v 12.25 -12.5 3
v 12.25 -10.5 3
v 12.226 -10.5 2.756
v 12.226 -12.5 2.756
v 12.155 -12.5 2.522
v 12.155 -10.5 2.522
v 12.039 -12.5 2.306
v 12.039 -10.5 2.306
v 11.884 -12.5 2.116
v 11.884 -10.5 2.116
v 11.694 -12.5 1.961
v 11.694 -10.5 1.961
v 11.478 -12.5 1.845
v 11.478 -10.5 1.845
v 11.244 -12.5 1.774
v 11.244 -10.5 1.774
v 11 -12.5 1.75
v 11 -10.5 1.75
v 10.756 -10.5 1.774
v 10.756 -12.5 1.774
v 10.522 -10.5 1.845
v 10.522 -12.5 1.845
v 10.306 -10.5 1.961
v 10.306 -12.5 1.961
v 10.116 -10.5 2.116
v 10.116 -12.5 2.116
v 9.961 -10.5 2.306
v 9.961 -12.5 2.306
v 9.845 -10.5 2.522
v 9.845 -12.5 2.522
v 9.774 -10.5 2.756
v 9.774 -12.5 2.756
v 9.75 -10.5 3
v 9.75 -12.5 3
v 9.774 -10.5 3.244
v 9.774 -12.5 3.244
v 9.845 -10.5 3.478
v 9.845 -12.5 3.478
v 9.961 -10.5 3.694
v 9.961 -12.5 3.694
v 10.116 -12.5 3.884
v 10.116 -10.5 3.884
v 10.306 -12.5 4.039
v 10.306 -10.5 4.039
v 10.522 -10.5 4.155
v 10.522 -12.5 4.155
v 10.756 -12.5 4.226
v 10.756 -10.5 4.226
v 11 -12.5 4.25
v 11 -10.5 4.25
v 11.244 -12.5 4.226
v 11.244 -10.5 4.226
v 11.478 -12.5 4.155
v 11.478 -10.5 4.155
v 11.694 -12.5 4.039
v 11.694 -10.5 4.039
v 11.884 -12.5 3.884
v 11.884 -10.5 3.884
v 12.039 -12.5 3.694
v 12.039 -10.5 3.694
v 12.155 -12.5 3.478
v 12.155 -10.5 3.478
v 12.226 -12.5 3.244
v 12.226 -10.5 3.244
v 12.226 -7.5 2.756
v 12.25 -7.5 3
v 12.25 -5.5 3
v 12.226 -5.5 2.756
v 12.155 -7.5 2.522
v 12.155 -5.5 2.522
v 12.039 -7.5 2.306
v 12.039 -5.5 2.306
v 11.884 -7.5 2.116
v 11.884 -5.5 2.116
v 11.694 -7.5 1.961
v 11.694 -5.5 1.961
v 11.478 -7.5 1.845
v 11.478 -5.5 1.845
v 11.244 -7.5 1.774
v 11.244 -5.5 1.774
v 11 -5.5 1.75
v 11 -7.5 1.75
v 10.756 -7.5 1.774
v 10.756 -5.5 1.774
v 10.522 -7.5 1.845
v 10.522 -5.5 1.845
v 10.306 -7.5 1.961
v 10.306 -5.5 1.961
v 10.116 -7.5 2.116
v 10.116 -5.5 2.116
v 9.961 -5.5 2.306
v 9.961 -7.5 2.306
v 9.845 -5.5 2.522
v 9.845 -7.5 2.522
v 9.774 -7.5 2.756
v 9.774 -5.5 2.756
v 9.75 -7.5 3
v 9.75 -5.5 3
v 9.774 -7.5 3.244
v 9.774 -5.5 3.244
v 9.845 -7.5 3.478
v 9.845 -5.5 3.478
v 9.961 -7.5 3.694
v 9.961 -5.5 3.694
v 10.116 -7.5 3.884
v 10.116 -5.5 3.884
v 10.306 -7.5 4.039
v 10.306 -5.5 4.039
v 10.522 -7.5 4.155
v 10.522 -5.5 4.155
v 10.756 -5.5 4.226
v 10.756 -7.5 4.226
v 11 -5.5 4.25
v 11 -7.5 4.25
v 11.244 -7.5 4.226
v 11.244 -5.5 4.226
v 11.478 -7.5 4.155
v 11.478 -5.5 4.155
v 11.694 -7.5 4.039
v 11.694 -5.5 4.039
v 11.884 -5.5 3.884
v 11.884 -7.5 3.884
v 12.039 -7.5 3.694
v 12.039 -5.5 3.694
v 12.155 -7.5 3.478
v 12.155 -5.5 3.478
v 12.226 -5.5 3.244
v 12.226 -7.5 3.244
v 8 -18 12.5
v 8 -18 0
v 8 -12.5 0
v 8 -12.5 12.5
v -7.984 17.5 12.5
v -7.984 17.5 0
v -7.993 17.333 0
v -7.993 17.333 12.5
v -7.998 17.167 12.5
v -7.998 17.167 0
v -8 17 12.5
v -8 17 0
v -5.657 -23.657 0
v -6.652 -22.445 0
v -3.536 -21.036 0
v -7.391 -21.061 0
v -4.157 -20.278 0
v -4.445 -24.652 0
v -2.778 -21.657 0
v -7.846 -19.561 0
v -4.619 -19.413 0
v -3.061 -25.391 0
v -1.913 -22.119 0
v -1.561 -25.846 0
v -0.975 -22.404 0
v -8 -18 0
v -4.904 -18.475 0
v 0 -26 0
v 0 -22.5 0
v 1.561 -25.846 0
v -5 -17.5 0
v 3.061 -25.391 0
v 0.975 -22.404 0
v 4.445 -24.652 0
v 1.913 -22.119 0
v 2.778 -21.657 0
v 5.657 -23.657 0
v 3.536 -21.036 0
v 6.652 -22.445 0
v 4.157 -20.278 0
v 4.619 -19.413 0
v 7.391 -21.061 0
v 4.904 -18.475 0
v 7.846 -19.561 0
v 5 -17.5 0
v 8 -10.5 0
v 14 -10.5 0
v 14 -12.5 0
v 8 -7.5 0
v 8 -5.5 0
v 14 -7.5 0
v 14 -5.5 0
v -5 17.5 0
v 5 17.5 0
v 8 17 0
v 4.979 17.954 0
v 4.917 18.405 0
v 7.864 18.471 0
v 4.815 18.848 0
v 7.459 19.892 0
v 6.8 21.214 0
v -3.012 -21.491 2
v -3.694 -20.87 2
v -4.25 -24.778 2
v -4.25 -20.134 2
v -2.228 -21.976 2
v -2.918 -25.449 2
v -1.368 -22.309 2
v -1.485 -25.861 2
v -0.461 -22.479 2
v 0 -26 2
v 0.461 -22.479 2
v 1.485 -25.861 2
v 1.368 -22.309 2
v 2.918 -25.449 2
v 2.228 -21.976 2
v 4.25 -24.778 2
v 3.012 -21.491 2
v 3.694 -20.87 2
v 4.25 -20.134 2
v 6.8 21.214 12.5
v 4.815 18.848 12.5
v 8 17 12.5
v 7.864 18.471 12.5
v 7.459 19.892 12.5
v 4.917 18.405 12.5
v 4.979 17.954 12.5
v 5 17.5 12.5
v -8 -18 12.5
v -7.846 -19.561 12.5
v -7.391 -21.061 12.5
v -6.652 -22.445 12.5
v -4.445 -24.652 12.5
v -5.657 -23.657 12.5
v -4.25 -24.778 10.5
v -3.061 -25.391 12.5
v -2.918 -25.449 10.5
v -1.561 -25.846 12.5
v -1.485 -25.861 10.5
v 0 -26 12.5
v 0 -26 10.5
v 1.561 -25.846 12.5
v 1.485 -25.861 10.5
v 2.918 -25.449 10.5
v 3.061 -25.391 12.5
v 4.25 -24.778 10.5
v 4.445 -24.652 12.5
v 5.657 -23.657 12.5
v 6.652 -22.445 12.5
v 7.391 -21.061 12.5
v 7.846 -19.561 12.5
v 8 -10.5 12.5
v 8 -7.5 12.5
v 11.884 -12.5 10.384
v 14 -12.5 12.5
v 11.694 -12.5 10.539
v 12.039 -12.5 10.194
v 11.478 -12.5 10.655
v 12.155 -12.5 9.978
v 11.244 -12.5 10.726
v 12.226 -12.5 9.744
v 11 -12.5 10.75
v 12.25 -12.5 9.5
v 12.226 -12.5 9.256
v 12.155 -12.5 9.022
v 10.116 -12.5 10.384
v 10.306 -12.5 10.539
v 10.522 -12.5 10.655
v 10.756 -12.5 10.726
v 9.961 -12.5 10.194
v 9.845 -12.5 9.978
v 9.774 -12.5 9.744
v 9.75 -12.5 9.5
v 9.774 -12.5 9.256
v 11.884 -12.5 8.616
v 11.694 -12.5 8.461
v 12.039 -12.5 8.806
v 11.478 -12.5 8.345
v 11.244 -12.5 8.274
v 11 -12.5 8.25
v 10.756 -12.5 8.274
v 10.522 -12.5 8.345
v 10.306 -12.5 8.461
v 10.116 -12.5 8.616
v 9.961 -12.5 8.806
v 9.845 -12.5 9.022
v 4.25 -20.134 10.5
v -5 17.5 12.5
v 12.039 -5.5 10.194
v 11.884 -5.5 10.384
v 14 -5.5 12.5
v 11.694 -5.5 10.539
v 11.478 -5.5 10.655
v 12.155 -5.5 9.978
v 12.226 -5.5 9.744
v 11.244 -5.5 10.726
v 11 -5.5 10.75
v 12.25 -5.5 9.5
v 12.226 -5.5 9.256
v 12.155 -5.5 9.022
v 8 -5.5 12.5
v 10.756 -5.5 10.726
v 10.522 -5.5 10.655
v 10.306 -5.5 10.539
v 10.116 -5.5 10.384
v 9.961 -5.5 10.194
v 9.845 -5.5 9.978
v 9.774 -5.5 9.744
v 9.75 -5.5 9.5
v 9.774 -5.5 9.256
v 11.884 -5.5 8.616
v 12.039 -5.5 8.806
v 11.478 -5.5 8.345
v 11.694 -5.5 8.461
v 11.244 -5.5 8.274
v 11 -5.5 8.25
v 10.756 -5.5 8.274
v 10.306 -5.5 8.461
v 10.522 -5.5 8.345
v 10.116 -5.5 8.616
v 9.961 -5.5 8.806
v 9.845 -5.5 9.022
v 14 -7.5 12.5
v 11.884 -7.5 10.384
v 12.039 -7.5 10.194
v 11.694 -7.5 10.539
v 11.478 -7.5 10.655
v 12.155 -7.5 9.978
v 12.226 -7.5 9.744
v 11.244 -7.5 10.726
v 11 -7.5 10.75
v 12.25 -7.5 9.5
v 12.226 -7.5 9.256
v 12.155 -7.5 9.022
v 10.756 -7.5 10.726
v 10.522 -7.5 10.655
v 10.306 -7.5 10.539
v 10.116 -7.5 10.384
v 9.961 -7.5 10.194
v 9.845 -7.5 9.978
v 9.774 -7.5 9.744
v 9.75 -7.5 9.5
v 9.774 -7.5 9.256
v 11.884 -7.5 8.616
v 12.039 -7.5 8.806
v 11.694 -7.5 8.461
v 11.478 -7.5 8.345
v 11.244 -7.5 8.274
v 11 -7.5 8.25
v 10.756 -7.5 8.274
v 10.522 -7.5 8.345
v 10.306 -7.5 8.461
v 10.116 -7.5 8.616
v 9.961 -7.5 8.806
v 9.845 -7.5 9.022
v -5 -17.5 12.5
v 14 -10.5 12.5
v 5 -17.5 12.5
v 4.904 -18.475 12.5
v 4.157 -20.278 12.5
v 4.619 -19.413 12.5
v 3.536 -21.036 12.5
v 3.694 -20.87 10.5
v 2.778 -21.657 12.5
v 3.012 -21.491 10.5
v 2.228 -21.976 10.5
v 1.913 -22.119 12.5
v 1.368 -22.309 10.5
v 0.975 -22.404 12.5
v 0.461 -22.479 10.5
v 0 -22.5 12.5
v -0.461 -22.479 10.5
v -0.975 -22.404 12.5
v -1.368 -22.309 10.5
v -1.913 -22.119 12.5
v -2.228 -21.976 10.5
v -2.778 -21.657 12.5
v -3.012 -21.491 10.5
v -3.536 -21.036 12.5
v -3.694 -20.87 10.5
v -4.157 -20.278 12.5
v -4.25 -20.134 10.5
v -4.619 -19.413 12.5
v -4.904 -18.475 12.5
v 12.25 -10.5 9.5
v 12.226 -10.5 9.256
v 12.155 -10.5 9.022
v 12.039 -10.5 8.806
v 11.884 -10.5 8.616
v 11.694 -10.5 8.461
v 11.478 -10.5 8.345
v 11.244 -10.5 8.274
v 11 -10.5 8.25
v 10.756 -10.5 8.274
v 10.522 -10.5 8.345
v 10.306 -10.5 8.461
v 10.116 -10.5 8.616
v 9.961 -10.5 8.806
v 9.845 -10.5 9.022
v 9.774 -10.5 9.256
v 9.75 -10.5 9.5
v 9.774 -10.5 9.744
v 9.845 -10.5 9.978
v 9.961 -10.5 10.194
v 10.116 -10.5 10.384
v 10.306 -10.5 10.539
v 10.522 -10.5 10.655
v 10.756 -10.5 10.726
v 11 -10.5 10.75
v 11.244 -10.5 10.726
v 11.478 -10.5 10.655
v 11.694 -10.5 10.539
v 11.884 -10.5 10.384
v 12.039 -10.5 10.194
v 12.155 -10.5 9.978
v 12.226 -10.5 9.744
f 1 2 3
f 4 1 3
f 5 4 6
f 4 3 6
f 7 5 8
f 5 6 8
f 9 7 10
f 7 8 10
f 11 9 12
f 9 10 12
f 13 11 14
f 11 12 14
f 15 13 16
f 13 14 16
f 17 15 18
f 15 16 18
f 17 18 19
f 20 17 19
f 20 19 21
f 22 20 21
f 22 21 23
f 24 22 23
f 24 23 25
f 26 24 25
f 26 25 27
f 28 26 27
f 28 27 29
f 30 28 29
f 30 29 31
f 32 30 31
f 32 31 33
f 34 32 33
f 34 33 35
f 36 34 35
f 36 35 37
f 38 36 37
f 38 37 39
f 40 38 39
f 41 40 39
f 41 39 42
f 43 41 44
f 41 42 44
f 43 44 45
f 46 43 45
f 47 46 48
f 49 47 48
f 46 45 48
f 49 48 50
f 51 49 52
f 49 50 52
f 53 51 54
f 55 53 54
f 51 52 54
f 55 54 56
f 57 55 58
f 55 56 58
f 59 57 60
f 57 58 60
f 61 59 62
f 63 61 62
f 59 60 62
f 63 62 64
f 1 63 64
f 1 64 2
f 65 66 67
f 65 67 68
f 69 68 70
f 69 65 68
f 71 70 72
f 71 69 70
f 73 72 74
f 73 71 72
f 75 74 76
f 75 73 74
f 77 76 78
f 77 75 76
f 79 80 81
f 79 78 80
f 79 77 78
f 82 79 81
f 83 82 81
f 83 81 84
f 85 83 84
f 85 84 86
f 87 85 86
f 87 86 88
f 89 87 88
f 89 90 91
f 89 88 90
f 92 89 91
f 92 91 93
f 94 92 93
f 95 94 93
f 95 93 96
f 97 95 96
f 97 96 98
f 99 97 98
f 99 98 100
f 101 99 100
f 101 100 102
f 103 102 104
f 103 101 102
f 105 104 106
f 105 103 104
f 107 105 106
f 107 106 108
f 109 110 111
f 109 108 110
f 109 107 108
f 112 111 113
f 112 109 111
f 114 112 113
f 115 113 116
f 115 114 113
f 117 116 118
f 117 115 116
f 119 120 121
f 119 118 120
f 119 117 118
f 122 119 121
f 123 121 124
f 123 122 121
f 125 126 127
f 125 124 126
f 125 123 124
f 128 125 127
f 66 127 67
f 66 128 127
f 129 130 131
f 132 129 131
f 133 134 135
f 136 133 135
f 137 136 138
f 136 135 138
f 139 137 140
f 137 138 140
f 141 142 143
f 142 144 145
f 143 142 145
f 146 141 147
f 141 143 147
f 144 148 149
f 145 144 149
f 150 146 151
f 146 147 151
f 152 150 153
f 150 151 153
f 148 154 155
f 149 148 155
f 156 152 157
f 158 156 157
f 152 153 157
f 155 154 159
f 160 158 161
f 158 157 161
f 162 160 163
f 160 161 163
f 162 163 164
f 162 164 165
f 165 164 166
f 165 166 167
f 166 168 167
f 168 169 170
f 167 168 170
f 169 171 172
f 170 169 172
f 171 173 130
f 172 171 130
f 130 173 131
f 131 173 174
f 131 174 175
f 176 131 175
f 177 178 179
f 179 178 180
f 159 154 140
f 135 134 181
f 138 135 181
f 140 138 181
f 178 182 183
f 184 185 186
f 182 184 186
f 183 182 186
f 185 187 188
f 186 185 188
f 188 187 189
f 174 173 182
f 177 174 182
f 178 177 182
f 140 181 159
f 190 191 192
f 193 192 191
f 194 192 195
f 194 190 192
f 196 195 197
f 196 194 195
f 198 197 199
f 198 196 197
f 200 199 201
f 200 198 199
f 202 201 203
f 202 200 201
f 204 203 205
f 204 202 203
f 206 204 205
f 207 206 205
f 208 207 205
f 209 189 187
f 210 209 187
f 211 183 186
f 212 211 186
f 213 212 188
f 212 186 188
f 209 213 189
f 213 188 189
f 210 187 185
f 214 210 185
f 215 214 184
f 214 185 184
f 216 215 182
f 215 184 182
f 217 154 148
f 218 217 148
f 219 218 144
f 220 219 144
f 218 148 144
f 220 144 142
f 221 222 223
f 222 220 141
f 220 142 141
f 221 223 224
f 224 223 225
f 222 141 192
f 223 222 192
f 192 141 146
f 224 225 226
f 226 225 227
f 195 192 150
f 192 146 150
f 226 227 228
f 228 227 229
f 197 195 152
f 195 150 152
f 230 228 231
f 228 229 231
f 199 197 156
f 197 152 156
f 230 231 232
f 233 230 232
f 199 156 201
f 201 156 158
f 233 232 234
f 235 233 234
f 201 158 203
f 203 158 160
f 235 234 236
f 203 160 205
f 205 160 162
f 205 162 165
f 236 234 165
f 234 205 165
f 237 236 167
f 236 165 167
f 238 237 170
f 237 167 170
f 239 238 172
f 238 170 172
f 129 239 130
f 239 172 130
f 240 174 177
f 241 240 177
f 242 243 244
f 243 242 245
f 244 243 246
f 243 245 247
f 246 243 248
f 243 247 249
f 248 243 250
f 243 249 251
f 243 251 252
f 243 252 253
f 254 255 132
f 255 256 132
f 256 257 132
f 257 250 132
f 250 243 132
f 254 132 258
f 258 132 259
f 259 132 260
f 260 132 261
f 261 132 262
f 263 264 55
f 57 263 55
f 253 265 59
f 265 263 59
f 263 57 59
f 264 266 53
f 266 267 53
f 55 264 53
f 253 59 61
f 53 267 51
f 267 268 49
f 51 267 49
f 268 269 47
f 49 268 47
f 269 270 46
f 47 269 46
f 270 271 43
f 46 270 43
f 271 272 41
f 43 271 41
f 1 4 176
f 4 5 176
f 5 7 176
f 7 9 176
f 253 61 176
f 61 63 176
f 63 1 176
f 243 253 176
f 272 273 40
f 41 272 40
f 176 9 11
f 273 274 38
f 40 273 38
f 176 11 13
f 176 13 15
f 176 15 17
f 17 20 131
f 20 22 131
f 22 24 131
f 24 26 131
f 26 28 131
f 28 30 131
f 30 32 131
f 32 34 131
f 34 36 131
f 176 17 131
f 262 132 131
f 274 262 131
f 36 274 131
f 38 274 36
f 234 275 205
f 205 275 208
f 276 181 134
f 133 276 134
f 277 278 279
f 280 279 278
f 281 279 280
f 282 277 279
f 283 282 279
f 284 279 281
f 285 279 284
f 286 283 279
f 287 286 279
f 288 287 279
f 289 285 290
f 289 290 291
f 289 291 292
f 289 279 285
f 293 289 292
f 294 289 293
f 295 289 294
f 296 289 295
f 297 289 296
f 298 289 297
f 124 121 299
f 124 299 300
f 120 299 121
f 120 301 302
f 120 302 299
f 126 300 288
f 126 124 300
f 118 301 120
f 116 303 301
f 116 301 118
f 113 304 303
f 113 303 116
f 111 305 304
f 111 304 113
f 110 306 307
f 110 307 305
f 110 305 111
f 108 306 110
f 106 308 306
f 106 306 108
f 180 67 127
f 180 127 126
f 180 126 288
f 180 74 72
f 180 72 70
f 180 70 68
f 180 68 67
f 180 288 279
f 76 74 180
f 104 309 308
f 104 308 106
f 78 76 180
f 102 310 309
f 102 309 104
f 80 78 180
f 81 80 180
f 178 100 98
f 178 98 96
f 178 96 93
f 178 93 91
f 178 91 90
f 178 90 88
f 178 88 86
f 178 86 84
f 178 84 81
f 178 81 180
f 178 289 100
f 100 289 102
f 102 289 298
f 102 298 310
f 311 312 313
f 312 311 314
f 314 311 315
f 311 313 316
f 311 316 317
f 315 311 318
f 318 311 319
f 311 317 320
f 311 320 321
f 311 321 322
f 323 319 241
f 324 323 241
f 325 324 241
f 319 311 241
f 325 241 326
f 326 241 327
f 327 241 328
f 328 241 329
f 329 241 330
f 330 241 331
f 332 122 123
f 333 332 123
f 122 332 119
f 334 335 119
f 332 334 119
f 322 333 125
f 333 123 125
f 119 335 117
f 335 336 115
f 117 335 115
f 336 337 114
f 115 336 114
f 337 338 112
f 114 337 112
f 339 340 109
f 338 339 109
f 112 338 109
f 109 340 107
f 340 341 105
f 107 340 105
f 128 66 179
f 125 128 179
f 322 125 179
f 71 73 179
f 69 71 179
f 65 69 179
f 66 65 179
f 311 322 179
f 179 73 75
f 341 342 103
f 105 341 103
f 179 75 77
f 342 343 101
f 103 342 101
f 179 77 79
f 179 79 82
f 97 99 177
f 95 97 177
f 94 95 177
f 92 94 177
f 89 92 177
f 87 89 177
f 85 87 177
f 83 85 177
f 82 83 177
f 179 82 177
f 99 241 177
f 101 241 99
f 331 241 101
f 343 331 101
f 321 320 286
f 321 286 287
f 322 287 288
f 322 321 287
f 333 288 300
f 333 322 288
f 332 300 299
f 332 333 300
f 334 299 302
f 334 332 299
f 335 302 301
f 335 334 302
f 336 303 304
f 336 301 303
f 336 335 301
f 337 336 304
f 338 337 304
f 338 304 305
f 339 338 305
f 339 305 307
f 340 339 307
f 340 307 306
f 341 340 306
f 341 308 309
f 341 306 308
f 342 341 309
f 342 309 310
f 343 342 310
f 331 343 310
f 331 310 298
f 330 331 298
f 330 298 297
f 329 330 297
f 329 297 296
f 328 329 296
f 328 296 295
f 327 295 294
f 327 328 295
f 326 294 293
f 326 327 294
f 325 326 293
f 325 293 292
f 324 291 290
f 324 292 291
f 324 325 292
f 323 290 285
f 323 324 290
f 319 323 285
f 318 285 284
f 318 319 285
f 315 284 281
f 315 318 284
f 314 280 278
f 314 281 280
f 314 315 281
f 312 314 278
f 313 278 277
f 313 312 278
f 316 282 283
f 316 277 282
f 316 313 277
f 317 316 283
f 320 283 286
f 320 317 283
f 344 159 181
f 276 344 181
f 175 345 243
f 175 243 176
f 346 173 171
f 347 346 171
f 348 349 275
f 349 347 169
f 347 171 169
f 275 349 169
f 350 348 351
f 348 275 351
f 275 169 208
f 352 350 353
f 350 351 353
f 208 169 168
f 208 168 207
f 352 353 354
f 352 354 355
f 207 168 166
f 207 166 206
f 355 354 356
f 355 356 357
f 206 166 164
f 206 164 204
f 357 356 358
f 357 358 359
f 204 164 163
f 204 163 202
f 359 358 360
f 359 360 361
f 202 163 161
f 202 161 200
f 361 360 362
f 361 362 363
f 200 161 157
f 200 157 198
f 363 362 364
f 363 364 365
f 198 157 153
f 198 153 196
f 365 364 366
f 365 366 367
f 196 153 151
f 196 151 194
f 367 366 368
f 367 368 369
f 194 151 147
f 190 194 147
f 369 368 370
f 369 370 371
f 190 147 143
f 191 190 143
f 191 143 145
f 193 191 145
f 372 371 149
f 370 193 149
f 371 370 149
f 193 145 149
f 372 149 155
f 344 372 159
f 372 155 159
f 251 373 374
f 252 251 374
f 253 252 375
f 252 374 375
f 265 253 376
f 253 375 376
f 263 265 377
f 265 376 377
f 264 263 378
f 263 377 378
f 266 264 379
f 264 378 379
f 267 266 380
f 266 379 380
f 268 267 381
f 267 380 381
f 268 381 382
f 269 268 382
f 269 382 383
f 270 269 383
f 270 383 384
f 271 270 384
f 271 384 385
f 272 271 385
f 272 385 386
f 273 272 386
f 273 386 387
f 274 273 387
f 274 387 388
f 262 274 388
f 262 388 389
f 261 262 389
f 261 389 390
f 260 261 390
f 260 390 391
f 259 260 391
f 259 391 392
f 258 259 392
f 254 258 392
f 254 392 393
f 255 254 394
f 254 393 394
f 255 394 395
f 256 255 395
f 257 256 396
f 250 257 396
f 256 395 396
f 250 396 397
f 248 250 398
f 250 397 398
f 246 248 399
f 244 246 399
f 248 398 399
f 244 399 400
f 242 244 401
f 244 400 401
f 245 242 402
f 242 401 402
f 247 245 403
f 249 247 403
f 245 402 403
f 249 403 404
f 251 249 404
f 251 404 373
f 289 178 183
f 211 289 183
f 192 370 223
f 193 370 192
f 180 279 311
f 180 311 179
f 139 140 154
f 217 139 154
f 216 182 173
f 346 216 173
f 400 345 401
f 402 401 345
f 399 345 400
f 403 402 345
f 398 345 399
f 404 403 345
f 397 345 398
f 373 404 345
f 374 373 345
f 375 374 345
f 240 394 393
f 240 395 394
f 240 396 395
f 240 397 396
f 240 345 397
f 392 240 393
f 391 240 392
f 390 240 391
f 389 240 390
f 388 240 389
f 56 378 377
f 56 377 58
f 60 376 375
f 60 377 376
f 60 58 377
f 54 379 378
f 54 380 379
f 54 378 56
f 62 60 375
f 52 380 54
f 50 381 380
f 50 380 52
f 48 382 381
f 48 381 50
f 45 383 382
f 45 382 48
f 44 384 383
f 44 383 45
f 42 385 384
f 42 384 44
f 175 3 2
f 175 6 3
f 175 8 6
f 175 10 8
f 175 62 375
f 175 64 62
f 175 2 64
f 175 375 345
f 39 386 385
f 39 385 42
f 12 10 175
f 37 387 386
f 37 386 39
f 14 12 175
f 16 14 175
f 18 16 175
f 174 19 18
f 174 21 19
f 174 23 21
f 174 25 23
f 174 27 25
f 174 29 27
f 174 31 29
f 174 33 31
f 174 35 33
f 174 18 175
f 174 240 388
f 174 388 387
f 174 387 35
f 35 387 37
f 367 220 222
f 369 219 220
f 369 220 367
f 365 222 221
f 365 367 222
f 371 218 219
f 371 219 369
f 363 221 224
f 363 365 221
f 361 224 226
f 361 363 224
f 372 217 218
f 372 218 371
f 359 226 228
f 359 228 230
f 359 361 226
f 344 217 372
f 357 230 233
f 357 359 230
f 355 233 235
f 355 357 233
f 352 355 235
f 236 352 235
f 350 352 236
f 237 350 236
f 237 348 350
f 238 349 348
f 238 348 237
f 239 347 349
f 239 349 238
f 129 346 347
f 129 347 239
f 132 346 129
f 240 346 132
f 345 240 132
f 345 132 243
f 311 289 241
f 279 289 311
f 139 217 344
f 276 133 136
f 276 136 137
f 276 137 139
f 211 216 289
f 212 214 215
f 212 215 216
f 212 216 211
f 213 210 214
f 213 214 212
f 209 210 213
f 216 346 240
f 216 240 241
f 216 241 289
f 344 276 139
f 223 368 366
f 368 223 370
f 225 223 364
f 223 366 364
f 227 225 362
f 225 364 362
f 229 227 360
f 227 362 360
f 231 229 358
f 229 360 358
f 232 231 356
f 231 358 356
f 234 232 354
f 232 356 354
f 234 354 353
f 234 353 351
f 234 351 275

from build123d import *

# Parameters (mm, degrees)
BOSS_EXTRUDE1_DEPTH     = 12.5
SKETCH2_W               = 12.5
SKETCH2_H               = 2
BOSS_EXTRUDE2_DEPTH     = 6
SKETCH3_R               = 1.25
CUT_EXTRUDE1_DEPTH      = 32.713927878
CUT_EXTRUDE1_DEPTH_BACK = 16.499999831
SKETCH5_W               = 8.5
SKETCH5_H               = 8.5
CUT_EXTRUDE2_DEPTH      = 26.999999831


with BuildPart() as part:
    # Sketch1 → Boss-Extrude1 (new body)
    with BuildSketch(Plane.XY):
        with BuildLine():
            ThreePointArc((8, 17), (7.694207367, 19.190701486), (6.80020675, 21.213927878))
            Line((6.80020675, 21.213927878), (4.814885895, 18.847914617))
            ThreePointArc((4.814885895, 18.847914617), (4.953505298, 18.180283222), (5, 17.5))
            Line((5, 17.5), (5, -17.5))
            ThreePointArc((5, -17.5), (0, -22.5), (-5, -17.5))
            Line((-5, -17.5), (-5, 17.5))
            Line((-5, 17.5), (-7.984359711, 17.5))
            ThreePointArc((-7.984359711, 17.5), (-7.996088972, 17.250122279), (-8, 17))
            Line((-8, 17), (-8, -17.999999662))
            ThreePointArc((-8, -17.999999662), (-1.69e-07, -25.999999831), (8, -18))
            Line((8, -18), (8, 17))
        make_face()
    extrude(amount=BOSS_EXTRUDE1_DEPTH)

    # Sketch2 → Boss-Extrude2 (add)
    with BuildSketch(Plane(origin=(8, 0, 0), x_dir=(0, 0, -1), z_dir=(1, 0, 0))):
        with Locations((-6.25, -11.5)):
            Rectangle(SKETCH2_W, SKETCH2_H)
        with Locations((-6.25, -6.5)):
            Rectangle(SKETCH2_W, SKETCH2_H)
    extrude(amount=BOSS_EXTRUDE2_DEPTH)

    # Sketch3 → Cut-Extrude1 (cut, two sides)
    with BuildSketch(Plane(origin=(0, -10.5, 0), x_dir=(1, 0, 0), z_dir=(0, 1, 0))) as cut_extrude1_sk:
        with Locations((11, -3)):
            Circle(SKETCH3_R)
        with Locations((11, -9.5)):
            Circle(SKETCH3_R)
    extrude(amount=CUT_EXTRUDE1_DEPTH, mode=Mode.SUBTRACT)
    extrude(cut_extrude1_sk.sketch, amount=-CUT_EXTRUDE1_DEPTH_BACK, mode=Mode.SUBTRACT)

    # Sketch5 → Cut-Extrude2 (cut, through all)
    with BuildSketch(Plane(origin=(0, 0, 0), x_dir=(1, 0, 0), z_dir=(0, 1, 0))):
        with Locations((0, -6.25)):
            Rectangle(SKETCH5_W, SKETCH5_H)
    extrude(amount=-CUT_EXTRUDE2_DEPTH, mode=Mode.SUBTRACT)


solid = part.part
